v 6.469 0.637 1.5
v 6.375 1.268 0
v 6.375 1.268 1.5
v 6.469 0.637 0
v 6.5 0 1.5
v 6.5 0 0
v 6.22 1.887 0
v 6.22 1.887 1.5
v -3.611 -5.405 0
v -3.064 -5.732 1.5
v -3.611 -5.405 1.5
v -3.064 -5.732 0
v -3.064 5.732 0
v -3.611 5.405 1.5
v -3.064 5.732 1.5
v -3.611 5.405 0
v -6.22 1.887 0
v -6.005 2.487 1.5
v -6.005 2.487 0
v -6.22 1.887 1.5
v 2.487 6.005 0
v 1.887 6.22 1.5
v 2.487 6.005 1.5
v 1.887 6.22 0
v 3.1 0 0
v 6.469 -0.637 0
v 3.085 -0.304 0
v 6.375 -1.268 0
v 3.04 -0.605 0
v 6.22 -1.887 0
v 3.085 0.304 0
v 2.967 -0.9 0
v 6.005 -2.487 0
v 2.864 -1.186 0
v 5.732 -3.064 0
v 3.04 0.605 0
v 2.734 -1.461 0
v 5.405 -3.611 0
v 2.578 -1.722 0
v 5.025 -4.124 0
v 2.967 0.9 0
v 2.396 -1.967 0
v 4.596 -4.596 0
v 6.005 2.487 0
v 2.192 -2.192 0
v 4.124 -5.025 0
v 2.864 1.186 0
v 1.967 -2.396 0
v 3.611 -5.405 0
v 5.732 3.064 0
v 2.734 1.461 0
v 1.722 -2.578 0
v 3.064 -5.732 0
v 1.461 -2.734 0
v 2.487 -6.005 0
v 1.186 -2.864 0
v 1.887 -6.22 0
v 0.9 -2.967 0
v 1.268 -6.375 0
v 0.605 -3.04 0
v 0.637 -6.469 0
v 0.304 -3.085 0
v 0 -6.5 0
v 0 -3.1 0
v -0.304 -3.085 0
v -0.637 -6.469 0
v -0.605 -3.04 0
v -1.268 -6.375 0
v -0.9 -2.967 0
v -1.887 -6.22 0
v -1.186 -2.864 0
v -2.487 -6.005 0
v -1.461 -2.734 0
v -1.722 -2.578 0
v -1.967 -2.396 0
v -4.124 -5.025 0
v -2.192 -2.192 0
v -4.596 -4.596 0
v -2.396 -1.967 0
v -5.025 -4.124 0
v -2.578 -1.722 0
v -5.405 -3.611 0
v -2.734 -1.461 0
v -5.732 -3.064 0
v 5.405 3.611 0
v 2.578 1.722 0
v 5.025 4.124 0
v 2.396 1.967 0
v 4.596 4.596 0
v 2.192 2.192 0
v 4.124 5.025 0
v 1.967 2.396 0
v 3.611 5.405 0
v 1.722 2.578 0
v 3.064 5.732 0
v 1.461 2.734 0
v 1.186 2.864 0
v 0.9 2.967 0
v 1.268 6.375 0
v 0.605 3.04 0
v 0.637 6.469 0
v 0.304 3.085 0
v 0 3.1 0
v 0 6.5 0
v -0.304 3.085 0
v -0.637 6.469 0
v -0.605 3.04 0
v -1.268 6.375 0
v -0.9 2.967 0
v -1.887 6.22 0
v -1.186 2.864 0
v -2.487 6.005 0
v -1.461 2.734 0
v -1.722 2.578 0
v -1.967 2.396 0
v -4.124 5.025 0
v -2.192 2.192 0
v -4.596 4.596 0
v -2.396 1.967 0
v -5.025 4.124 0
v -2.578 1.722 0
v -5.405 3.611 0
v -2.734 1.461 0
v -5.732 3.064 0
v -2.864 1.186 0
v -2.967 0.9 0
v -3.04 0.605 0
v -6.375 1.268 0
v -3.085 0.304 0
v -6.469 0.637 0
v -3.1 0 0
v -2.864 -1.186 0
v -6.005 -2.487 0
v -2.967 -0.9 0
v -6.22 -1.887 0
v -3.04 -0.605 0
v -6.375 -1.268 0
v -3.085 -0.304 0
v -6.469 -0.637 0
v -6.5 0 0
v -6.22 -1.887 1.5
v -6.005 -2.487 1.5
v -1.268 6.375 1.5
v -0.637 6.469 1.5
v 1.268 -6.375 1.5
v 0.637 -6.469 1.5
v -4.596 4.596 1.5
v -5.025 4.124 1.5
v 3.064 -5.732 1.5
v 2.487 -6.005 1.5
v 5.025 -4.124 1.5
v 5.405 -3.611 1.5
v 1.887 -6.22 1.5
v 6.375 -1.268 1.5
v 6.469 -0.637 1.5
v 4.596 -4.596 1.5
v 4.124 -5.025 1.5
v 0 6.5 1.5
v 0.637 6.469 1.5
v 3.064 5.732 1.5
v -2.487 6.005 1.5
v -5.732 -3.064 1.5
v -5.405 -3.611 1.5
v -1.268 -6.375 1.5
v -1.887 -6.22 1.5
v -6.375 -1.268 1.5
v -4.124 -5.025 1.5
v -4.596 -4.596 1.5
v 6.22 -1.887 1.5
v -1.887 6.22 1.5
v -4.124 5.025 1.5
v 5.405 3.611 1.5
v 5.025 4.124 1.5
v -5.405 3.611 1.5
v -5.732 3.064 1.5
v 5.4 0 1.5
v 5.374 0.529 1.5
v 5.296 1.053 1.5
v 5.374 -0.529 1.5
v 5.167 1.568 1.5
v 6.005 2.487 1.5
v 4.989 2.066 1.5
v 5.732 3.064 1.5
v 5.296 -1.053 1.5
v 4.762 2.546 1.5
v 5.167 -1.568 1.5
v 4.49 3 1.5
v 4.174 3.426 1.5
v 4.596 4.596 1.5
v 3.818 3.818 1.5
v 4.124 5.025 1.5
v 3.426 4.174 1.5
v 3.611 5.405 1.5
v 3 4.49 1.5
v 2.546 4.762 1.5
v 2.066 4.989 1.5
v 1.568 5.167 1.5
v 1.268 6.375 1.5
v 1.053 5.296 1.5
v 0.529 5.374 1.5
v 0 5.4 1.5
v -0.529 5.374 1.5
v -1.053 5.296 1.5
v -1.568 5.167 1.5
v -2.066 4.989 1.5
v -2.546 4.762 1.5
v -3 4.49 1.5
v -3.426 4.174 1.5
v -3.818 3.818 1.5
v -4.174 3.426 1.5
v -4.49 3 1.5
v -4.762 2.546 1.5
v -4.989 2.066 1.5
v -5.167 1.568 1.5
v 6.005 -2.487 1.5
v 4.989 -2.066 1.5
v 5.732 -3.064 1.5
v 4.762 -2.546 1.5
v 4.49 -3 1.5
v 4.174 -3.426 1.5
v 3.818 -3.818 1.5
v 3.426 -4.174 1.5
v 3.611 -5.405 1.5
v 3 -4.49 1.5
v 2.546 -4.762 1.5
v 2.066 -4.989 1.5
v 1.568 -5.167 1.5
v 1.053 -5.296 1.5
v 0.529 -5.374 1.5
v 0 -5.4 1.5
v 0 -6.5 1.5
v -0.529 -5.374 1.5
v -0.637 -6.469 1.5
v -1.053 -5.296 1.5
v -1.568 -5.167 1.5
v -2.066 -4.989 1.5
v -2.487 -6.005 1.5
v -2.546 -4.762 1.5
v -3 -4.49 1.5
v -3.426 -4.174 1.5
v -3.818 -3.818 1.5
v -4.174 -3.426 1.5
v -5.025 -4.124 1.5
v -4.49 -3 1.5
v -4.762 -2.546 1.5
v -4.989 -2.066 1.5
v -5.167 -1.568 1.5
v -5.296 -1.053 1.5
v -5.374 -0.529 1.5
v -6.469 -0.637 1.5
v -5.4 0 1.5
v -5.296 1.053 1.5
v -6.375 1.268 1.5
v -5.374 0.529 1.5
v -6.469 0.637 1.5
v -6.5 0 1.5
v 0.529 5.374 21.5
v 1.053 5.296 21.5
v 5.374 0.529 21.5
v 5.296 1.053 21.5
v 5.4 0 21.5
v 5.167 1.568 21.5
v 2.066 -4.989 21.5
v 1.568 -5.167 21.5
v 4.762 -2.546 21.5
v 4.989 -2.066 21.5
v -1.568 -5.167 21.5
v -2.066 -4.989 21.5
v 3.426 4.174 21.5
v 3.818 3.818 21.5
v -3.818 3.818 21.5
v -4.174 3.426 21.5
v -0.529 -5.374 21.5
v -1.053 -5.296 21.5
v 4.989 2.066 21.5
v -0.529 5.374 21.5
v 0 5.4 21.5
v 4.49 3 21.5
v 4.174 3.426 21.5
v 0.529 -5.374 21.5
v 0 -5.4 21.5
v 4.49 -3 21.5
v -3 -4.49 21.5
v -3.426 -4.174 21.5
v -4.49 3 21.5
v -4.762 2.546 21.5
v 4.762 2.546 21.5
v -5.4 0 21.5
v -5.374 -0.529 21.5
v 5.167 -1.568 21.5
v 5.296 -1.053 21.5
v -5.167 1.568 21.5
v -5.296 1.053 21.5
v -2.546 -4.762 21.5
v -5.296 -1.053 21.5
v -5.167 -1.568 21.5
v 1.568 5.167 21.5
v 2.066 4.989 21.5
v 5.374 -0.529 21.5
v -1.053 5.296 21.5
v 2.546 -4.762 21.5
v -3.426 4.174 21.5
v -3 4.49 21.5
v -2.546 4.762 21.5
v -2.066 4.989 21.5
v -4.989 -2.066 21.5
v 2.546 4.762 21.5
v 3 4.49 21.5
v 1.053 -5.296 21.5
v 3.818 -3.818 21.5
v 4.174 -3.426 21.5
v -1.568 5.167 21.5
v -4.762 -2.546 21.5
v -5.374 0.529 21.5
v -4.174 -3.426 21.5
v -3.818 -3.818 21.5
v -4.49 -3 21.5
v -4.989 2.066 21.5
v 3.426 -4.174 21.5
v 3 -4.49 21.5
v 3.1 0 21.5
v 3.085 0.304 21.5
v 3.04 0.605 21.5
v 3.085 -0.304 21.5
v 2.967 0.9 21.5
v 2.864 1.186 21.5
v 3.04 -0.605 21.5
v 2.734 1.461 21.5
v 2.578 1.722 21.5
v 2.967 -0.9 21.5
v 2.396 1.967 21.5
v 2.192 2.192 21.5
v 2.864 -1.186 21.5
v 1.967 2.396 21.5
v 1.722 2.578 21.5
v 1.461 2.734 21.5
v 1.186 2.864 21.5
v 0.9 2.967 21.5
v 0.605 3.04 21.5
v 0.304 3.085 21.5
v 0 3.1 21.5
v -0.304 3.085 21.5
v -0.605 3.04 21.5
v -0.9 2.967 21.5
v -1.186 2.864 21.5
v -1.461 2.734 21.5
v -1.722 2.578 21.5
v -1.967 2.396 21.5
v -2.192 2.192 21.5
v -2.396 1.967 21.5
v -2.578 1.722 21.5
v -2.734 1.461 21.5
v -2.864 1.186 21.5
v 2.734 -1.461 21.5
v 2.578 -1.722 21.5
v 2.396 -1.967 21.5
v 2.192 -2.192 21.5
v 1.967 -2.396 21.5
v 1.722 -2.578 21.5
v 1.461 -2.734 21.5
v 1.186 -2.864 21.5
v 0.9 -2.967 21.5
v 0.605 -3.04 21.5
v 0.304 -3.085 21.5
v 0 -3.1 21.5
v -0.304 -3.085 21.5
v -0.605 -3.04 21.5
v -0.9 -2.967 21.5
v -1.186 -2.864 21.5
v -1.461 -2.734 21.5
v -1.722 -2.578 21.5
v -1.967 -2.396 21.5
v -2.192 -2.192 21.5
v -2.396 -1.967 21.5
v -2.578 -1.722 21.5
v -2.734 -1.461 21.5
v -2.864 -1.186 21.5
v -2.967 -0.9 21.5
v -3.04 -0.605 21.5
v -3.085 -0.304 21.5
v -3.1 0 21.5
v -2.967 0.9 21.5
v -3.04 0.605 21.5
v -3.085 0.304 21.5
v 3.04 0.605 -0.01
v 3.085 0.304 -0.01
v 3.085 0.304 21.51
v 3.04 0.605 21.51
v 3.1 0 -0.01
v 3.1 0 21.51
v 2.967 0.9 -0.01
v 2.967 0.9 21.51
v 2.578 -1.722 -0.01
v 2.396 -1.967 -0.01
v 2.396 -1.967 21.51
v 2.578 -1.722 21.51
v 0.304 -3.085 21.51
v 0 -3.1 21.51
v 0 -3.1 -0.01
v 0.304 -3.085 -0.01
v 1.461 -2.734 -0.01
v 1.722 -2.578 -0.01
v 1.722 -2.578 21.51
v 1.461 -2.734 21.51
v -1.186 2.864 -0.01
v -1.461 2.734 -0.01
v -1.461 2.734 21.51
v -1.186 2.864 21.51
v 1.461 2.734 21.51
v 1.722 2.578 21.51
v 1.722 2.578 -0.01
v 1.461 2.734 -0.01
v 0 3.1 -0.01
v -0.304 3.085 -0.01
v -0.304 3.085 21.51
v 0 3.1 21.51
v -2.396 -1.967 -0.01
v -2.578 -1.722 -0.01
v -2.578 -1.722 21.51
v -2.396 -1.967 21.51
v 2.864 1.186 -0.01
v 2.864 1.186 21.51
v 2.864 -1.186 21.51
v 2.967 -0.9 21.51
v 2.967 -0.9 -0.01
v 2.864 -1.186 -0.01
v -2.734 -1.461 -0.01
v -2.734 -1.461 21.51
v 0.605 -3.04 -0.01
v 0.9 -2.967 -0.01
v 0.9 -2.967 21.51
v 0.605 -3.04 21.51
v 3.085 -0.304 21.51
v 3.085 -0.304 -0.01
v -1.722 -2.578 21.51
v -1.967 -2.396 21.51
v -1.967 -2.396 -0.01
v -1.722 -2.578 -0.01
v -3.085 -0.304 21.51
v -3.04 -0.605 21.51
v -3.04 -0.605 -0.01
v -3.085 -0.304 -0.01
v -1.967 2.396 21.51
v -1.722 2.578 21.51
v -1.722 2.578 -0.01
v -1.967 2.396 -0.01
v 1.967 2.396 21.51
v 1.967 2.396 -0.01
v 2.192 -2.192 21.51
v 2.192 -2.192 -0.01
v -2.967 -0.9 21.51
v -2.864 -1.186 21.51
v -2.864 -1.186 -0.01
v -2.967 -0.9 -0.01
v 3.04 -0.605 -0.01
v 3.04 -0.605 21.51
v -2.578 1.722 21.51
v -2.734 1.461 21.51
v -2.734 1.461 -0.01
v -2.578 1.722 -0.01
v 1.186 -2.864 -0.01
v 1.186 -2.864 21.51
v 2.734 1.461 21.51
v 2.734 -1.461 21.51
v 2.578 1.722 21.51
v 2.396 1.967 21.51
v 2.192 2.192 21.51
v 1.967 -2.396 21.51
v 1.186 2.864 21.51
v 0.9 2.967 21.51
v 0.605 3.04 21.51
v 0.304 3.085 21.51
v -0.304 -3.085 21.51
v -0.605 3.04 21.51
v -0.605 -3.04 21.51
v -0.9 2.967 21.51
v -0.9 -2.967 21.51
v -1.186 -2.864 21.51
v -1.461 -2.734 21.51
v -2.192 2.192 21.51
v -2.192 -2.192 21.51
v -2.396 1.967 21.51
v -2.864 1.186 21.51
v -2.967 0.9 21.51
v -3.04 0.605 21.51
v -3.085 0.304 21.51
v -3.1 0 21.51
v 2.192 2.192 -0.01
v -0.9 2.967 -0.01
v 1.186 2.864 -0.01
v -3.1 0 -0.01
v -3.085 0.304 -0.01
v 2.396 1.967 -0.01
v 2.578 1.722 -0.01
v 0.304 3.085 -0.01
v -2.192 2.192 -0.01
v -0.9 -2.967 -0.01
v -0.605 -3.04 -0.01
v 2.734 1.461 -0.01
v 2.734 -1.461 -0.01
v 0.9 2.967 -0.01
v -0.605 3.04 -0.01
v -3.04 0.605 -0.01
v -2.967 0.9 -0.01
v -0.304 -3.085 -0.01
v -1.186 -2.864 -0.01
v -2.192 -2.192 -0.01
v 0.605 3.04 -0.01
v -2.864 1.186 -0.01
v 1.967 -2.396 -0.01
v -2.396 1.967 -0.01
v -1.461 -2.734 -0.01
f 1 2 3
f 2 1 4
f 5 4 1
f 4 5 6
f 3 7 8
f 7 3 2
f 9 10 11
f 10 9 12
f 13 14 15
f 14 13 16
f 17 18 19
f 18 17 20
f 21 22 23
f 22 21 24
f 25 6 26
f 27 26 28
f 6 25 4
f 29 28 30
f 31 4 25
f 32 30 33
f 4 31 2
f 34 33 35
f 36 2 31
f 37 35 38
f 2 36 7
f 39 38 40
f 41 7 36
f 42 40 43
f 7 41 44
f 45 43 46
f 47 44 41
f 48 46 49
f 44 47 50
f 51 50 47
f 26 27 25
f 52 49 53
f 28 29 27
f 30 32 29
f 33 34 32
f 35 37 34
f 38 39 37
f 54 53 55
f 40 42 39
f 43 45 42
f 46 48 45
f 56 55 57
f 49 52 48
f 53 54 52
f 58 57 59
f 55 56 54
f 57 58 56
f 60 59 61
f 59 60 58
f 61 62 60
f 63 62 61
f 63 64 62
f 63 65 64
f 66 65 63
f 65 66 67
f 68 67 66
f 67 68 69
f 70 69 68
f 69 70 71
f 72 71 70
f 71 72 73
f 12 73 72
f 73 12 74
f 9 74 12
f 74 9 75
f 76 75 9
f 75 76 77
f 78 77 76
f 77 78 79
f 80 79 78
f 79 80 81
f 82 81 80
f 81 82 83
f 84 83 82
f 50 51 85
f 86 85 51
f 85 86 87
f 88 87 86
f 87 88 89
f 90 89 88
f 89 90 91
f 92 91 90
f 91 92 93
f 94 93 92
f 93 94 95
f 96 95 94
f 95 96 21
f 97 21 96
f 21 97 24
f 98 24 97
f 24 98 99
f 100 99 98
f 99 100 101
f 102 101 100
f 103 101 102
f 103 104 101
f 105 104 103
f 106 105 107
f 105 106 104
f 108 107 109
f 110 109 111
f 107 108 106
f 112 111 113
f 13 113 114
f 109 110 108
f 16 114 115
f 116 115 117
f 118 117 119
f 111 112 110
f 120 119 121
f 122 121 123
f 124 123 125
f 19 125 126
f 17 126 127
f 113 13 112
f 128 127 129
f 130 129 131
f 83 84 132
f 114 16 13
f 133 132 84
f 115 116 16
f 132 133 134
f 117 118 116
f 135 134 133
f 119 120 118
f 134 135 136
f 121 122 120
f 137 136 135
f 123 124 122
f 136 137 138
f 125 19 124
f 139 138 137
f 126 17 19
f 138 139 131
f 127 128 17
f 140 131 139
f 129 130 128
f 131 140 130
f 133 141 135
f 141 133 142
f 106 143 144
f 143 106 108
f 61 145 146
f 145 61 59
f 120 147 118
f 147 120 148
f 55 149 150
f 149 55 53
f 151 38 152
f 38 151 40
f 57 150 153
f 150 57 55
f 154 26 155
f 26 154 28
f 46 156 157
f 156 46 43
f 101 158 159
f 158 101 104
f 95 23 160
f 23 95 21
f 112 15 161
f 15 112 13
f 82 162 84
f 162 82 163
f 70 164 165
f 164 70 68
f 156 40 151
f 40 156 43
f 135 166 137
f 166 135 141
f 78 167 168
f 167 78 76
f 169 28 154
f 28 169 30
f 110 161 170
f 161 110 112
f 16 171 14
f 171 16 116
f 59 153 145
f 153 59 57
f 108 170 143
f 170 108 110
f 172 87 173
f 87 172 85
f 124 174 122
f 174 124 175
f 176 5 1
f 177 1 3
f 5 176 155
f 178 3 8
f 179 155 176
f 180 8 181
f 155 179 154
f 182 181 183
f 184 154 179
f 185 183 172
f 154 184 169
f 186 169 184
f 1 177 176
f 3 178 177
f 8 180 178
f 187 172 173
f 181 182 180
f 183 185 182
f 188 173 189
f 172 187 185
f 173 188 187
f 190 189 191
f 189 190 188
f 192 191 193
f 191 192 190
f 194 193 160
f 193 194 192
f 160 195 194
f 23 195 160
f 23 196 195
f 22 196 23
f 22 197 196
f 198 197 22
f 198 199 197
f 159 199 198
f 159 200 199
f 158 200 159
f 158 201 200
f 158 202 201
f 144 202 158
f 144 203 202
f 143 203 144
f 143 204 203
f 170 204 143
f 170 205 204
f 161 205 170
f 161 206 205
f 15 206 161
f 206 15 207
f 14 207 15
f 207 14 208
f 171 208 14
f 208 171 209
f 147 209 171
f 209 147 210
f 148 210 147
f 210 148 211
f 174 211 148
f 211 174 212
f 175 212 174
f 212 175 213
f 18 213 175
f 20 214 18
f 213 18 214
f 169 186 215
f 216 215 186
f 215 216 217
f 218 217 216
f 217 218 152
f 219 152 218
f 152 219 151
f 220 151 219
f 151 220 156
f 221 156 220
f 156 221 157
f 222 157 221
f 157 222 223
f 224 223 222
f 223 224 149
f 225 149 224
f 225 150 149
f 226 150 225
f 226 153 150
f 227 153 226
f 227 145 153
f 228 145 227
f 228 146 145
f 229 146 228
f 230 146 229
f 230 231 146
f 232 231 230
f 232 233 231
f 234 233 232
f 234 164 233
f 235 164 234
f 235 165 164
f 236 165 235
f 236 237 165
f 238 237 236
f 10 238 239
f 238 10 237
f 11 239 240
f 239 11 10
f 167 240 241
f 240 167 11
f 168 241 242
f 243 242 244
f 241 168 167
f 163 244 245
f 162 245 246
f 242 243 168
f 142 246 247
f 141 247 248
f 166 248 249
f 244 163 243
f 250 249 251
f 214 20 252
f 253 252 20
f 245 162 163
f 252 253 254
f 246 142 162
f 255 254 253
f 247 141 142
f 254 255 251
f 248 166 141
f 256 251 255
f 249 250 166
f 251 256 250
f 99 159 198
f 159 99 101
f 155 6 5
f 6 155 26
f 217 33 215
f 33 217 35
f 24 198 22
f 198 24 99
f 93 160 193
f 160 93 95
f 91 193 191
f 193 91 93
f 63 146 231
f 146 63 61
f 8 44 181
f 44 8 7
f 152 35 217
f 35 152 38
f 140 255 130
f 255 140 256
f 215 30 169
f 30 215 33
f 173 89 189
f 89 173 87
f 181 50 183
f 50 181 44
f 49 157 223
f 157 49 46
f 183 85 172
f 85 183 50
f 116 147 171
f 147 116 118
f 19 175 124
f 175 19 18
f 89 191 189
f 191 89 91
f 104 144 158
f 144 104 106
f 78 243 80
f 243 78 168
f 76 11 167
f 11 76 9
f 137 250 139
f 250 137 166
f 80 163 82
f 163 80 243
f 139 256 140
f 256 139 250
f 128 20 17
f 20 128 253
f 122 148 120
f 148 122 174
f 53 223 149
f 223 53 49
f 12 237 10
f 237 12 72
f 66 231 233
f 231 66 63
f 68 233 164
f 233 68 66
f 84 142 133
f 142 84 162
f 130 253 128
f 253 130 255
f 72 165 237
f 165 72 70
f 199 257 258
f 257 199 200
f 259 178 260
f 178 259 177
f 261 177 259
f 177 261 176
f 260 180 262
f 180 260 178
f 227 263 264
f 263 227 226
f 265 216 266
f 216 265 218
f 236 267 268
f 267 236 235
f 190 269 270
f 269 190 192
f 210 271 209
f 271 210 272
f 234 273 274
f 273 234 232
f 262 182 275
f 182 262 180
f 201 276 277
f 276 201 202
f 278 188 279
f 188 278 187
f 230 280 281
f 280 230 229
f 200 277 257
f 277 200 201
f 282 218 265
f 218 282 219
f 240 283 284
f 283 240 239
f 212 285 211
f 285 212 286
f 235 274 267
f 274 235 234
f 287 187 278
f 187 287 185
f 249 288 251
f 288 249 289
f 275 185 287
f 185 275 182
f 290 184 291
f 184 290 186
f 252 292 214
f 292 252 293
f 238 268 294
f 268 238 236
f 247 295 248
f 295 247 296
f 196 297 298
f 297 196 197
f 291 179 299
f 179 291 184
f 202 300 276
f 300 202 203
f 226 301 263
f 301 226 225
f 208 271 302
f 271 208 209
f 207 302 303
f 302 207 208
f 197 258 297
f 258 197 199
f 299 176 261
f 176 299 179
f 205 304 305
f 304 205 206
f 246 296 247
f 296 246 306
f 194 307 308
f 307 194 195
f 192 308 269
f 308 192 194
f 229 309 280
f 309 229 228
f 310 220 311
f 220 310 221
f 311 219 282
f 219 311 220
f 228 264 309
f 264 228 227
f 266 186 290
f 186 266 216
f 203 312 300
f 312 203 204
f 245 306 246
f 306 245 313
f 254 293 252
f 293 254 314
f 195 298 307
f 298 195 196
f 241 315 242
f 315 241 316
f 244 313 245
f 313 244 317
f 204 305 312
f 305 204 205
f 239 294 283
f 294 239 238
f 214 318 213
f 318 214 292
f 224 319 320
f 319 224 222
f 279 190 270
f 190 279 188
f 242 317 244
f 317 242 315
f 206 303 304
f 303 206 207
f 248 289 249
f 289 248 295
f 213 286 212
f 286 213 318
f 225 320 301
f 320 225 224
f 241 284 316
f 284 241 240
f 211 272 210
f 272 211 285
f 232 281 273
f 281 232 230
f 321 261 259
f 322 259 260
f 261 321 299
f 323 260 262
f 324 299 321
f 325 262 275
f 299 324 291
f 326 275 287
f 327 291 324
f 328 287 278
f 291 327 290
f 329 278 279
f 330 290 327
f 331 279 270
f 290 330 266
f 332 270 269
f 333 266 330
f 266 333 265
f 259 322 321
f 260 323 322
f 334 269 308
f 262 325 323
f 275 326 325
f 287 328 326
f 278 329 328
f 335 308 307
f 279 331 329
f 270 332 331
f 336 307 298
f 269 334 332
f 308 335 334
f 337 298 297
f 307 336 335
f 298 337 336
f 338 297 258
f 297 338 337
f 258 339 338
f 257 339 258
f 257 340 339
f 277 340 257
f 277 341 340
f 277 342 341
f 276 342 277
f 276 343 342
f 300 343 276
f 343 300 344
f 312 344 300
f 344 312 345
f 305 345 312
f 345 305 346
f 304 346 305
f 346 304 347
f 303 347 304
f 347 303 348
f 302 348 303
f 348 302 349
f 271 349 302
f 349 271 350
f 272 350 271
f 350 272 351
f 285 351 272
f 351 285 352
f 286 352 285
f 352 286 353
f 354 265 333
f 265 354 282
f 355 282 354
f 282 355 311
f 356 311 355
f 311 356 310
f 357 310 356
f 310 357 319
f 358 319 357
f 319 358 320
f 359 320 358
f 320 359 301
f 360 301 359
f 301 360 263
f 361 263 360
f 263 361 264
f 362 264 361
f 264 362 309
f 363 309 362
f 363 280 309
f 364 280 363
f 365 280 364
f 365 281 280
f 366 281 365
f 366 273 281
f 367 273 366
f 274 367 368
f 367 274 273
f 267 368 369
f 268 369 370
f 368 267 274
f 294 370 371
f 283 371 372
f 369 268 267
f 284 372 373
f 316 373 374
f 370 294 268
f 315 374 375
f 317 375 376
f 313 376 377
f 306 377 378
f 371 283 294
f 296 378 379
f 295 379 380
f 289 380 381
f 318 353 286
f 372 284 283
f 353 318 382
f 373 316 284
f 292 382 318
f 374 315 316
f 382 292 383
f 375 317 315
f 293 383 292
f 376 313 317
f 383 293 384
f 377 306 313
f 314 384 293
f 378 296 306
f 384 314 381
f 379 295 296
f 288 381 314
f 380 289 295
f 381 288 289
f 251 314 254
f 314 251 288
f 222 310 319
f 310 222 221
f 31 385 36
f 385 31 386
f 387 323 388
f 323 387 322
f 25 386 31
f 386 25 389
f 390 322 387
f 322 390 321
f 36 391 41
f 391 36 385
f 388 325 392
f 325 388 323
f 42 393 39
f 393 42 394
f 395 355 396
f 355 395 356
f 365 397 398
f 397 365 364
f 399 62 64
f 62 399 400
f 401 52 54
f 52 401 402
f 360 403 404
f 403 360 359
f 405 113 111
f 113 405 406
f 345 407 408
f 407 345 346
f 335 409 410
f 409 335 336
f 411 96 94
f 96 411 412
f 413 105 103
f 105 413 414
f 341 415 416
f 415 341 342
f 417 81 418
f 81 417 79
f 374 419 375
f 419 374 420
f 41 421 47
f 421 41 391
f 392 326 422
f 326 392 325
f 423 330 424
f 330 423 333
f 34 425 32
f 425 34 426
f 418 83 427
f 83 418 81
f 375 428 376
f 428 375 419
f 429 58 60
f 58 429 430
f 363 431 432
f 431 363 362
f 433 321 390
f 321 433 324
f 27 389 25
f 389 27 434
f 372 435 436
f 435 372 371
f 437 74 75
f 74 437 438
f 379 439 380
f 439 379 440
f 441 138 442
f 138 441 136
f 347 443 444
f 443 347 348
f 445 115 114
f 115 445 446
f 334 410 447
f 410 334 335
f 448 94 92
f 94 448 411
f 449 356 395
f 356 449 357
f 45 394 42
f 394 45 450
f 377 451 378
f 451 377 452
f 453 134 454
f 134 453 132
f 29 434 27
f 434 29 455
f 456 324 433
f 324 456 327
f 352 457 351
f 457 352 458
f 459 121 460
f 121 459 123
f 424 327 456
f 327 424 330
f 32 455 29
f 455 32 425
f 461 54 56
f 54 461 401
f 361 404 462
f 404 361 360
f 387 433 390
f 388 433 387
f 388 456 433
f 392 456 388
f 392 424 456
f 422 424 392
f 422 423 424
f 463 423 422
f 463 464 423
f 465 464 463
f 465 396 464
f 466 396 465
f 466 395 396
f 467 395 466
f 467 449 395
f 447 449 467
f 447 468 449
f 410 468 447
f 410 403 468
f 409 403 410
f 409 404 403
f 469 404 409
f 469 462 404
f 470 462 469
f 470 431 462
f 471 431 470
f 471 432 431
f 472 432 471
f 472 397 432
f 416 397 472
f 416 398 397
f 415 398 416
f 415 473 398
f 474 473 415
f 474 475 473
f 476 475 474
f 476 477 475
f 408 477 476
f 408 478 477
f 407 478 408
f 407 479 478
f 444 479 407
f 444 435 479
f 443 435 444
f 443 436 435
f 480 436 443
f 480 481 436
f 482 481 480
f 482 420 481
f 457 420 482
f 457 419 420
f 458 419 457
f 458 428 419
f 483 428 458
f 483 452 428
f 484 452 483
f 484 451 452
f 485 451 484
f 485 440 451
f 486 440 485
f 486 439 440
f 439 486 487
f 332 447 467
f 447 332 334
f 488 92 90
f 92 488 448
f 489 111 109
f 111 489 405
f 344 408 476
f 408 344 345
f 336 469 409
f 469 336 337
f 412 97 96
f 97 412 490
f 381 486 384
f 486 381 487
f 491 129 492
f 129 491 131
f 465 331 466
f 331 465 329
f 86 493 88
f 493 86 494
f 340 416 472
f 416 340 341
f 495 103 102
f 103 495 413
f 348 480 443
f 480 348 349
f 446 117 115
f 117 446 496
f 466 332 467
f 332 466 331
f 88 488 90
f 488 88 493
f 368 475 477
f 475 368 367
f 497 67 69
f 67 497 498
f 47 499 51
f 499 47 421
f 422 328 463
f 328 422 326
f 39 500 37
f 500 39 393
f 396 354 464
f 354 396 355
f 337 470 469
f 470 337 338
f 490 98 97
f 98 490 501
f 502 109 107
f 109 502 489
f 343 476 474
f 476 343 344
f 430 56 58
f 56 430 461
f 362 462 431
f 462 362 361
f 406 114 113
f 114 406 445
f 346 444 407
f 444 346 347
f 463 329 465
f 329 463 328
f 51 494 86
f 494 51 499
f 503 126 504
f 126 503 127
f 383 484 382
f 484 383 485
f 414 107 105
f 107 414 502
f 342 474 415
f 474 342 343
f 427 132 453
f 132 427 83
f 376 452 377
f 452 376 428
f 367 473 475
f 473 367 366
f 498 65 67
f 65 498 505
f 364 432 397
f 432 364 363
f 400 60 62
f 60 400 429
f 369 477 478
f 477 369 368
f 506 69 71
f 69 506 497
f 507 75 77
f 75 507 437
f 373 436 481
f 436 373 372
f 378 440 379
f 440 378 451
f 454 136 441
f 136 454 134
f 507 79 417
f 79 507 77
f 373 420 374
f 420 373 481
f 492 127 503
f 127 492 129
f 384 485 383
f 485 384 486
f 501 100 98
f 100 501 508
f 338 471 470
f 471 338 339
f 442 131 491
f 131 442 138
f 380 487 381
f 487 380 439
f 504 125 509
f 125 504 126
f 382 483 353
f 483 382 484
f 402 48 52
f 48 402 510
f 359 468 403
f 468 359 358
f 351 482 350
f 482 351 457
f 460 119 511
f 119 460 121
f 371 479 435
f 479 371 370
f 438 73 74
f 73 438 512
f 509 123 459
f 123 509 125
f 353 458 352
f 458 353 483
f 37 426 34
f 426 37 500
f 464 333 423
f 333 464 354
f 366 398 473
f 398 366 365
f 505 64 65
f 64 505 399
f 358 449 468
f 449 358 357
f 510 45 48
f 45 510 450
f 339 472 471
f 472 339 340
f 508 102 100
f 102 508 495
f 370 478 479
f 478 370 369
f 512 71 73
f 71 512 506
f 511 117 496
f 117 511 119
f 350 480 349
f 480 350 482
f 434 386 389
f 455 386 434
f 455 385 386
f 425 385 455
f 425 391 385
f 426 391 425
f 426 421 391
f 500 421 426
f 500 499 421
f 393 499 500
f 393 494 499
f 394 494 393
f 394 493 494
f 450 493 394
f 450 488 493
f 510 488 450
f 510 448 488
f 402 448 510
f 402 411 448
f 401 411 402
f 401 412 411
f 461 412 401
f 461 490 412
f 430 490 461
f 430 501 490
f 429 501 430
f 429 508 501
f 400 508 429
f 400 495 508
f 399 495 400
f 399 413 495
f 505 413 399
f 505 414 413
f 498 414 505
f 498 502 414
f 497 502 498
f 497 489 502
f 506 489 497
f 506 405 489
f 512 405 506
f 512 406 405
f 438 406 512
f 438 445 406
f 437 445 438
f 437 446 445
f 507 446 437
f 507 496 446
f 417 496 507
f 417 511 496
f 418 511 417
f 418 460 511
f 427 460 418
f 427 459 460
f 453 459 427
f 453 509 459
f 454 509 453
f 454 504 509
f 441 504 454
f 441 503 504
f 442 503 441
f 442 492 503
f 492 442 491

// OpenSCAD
// PCR tube adapter sleeve for 0.2 mL tube in 1.5 mL rack hole
// Print upside down: collar on bed, sleeve body upward

// Dimensions
collar_diameter = 13;        // Outer diameter of collar
collar_height = 1.5;         // Height of collar
sleeve_outer_diameter = 10.8; // Outer diameter of sleeve body
sleeve_height = 21.5;         // Total height of sleeve (from collar base)
bore_diameter = 6.2;           // Diameter of central bore

// Main body
union() {
  // Collar
  cylinder(h = collar_height, d = collar_diameter, center = false, $fn = 64);
  
  // Sleeve body
  translate([0, 0, collar_height]) 
    cylinder(h = sleeve_height - collar_height, d = sleeve_outer_diameter, center = false, $fn = 64);
  
  // Central bore
  translate([0, 0, -0.01]) 
    cylinder(h = sleeve_height + 0.02, d = bore_diameter, center = false, $fn = 64);
}
